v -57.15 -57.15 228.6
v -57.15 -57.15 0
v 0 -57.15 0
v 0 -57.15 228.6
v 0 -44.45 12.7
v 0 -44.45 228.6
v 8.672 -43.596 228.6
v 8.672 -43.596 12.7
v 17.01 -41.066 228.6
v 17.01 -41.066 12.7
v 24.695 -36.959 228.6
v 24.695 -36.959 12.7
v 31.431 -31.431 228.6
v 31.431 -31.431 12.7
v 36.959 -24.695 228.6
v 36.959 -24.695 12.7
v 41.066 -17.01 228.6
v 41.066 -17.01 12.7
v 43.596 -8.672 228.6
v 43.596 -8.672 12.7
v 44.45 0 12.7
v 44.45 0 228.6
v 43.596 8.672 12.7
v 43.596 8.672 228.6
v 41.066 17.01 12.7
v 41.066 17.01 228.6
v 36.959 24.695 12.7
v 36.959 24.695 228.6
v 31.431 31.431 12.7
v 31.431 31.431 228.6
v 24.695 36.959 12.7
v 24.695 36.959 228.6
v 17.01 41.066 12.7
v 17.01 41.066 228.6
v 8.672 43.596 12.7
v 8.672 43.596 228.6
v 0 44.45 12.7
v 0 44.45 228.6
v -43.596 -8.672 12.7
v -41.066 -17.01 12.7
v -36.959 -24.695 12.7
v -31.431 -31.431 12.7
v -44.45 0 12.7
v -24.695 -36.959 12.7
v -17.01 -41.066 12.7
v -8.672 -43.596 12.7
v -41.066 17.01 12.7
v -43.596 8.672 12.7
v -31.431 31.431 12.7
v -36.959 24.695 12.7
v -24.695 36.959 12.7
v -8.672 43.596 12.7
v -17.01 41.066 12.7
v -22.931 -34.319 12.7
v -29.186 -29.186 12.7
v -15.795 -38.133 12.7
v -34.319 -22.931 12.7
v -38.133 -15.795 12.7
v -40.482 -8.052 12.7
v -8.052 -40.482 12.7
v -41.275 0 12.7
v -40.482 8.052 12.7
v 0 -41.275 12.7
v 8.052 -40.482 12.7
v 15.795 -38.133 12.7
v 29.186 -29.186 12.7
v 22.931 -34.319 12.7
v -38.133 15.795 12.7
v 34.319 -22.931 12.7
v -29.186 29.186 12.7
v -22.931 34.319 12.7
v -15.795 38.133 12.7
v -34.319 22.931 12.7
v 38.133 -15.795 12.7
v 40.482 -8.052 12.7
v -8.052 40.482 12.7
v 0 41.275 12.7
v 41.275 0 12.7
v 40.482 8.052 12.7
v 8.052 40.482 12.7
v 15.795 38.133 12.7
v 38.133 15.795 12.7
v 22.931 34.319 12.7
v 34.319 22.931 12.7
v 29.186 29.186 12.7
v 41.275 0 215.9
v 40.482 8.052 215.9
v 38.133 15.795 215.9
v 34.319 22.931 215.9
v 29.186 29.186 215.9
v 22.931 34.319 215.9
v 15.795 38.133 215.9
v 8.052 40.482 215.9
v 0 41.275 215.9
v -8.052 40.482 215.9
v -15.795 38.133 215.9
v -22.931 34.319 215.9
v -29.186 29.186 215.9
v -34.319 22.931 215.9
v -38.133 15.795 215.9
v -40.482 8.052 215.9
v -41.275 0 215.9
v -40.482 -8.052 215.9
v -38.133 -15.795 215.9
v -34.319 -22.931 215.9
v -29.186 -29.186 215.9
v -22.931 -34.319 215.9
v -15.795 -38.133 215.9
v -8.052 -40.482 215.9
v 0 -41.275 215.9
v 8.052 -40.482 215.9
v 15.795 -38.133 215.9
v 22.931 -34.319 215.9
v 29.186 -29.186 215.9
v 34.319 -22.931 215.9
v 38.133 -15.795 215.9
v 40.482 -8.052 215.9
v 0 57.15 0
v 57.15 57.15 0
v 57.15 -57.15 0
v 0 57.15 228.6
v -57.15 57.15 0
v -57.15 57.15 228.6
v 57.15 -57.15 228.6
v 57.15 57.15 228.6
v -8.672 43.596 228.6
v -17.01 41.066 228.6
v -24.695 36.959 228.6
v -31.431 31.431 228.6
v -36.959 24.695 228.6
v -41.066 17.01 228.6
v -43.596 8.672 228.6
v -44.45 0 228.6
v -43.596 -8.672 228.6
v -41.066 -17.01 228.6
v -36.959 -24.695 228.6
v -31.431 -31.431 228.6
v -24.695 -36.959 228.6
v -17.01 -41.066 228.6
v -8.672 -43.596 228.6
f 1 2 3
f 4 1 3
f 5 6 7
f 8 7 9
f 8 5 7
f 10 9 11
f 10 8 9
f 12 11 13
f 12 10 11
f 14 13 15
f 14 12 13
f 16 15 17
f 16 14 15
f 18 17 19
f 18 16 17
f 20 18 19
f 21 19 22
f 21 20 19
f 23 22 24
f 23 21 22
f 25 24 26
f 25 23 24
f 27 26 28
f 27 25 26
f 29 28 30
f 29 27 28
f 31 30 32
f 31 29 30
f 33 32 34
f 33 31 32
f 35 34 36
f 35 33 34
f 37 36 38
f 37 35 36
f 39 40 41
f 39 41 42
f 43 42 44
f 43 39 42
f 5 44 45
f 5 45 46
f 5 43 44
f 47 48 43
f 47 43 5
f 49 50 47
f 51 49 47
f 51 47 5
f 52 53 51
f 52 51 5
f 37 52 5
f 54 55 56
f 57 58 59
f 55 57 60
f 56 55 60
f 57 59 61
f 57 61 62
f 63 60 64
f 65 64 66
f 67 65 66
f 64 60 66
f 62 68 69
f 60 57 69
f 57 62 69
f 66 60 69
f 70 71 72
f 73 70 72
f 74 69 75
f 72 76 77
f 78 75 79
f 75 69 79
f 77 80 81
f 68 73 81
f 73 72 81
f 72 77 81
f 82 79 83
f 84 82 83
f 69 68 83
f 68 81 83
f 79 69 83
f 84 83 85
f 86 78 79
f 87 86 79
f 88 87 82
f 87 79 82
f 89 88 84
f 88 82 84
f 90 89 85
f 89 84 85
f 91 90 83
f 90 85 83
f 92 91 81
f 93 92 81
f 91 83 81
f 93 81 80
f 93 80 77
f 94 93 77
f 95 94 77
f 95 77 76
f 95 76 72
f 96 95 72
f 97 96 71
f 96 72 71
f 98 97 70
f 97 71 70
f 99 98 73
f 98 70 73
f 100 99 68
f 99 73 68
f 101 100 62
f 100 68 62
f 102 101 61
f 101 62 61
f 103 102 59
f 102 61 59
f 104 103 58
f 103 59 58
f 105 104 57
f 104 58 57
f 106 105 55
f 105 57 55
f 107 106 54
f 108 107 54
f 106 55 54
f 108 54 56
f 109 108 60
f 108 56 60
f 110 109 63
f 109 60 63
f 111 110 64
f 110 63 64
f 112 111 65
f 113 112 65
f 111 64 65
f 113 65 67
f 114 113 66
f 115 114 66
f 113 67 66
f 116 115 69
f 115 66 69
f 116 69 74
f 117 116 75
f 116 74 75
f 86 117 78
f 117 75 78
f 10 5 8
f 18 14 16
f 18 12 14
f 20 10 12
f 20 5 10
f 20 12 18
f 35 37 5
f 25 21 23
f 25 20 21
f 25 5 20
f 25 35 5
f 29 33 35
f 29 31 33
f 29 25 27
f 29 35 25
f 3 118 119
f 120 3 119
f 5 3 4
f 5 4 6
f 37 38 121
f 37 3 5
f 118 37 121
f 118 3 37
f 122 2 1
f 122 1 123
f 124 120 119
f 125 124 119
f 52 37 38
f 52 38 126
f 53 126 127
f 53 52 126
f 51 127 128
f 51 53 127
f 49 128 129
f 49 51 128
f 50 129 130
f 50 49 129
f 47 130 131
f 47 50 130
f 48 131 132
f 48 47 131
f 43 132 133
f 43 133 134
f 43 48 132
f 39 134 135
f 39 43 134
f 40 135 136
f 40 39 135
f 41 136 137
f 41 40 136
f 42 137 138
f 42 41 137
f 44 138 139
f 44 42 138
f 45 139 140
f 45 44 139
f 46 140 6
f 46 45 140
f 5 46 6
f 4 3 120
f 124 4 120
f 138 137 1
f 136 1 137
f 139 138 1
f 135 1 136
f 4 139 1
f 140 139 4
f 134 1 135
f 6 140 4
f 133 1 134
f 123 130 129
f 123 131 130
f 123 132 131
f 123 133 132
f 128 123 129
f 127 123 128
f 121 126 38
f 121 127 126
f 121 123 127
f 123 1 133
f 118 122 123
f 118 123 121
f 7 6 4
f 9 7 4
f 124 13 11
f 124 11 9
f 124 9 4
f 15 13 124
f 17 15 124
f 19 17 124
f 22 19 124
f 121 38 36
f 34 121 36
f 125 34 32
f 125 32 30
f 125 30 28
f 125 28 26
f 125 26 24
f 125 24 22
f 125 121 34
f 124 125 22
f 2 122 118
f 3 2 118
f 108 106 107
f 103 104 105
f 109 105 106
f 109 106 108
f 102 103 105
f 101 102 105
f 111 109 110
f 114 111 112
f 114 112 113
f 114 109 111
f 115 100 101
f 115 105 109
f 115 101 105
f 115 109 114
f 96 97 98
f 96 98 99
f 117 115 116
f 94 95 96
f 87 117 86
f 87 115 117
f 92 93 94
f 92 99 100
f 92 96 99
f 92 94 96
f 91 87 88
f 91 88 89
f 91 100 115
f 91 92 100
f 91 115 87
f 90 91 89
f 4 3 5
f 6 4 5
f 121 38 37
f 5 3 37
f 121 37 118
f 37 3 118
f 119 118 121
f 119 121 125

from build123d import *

# Parameters (mm, degrees)
F0_W     = 63.5
F0_H     = 114.3
F1_DEPTH = 228.6
F2_DEPTH = 228.6
F4_R     = 41.275
F5_DEPTH = 203.2
F4_R_2   = 44.45
F6_DEPTH = 215.9
F7_W     = 6.35
F7_H     = 114.3
F8_DEPTH = 228.601


with BuildPart() as f1:
    # F0 (on Top) → F1 (new body)
    with BuildSketch(Plane.XY):
        with Locations((-31.75, 0)):
            Rectangle(F0_W, F0_H)
    extrude(amount=F1_DEPTH)


with BuildPart() as f2:
    # F0 (on Top) → F2 (new body)
    with BuildSketch(Plane.XY):
        with Locations((31.75, 0)):
            Rectangle(F0_W, F0_H)
    extrude(amount=F2_DEPTH)


with BuildPart() as f5:
    # F4 (on offset) → F5 (new body)
    with BuildSketch(Plane.XY.offset(12.7)):
        Circle(F4_R)
    extrude(amount=F5_DEPTH)


with BuildPart() as f6_tool:
    # F4 (on offset) → F6 (new body, through all)
    with BuildSketch(Plane.XY.offset(12.7)):
        Circle(F4_R_2)
        Circle(F4_R, mode=Mode.SUBTRACT)
        Circle(F4_R)
    extrude(amount=F6_DEPTH)


with BuildPart() as f1_1:
    add(f1.part)

    # F6: cut by f6_tool
    add(f6_tool.part, mode=Mode.SUBTRACT)


with BuildPart() as f2_1:
    add(f2.part)

    # F6: cut by f6_tool
    add(f6_tool.part, mode=Mode.SUBTRACT)


with BuildPart() as f8_tool:
    # F7 (on Top) → F8 (new body, through all)
    with BuildSketch(Plane.XY):
        with Locations((-60.325, 0)):
            Rectangle(F7_W, F7_H)
        with Locations((60.325, 0)):
            Rectangle(F7_W, F7_H)
    extrude(amount=F8_DEPTH)


with BuildPart() as f1_2:
    add(f1_1.part)

    # F8: cut by f8_tool
    add(f8_tool.part, mode=Mode.SUBTRACT)


with BuildPart() as f2_2:
    add(f2_1.part)

    # F8: cut by f8_tool
    add(f8_tool.part, mode=Mode.SUBTRACT)


solid = Compound([f5.part, f1_2.part, f2_2.part])
